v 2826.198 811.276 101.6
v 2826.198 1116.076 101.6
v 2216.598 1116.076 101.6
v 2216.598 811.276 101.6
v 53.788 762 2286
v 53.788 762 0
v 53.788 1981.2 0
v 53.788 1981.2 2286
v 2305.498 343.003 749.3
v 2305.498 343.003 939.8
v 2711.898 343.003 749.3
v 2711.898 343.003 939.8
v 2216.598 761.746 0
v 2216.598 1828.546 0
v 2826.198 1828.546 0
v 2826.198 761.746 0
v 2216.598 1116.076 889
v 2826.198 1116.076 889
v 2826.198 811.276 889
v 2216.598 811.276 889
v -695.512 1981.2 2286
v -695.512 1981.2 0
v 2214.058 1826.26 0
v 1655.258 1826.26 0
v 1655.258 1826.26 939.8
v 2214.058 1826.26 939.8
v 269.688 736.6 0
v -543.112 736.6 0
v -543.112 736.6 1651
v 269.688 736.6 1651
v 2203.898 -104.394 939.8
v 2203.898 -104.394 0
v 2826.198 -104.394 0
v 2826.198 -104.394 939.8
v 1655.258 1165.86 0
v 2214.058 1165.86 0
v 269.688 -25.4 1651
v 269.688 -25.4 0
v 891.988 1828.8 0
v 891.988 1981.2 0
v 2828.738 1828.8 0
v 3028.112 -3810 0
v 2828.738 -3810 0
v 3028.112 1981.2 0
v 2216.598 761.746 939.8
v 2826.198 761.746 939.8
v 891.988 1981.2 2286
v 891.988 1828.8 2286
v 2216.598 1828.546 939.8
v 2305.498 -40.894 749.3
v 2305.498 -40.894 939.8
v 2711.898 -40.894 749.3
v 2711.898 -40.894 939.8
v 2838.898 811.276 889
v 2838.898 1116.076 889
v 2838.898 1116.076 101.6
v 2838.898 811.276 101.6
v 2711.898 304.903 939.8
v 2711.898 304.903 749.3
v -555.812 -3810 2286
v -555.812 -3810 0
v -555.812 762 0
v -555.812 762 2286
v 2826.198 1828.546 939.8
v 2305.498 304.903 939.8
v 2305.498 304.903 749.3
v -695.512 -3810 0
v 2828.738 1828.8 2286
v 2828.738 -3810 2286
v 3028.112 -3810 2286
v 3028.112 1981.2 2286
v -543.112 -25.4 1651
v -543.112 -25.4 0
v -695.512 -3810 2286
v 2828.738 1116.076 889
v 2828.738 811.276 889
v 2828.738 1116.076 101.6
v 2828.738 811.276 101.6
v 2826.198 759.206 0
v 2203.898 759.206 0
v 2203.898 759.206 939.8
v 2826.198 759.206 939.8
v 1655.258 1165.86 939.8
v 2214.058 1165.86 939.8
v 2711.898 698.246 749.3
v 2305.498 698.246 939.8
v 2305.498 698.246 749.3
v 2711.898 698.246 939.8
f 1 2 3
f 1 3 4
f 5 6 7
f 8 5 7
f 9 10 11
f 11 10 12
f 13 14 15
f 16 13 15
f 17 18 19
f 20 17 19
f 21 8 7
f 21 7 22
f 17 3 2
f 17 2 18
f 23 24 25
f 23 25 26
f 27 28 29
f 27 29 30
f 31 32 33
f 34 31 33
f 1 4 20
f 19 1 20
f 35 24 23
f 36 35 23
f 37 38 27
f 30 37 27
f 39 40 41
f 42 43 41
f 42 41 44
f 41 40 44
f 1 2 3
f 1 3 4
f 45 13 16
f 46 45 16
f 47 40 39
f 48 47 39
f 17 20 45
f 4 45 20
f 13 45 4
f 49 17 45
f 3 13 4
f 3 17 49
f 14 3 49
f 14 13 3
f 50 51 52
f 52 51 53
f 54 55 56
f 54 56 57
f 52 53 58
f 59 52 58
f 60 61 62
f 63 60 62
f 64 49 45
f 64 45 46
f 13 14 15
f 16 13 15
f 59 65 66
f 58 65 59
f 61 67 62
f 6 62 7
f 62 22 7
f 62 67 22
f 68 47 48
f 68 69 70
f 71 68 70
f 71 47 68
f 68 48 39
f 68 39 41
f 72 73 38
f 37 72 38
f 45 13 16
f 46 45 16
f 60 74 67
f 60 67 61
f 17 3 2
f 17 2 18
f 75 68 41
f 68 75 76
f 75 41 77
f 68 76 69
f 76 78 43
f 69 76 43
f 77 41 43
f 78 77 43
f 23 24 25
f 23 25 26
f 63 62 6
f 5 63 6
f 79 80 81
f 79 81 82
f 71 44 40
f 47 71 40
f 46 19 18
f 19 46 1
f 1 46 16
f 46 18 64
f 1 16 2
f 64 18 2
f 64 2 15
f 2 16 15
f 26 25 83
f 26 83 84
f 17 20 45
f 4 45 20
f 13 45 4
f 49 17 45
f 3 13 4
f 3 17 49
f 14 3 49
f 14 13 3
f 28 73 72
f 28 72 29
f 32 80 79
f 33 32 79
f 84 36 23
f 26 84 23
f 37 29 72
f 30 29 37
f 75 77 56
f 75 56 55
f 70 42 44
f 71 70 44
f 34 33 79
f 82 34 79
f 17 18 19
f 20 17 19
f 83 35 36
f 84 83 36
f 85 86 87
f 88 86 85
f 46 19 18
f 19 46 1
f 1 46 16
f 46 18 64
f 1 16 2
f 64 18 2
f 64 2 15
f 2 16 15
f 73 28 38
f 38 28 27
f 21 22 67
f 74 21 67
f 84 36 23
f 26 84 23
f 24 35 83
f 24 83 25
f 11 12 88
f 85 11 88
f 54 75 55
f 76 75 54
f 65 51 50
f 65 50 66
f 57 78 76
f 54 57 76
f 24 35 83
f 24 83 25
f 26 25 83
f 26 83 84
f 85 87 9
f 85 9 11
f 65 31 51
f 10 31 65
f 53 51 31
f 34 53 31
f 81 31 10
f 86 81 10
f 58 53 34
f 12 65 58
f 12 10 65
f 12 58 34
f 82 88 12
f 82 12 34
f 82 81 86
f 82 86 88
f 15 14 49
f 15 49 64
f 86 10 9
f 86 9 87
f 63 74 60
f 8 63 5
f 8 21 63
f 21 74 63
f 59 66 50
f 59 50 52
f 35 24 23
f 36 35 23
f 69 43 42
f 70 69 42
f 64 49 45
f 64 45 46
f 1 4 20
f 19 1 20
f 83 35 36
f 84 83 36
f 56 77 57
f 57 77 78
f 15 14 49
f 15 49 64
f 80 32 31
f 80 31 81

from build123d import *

# Parameters (mm, degrees)
F1_DEPTH  = 2286
F2_W      = 812.8
F2_H      = 762
F3_DEPTH  = 1651
F4_W      = 609.6
F4_H      = 1066.8
F4_W_2    = 558.8
F4_H_2    = 660.4
F5_DEPTH  = 939.8
F6_DEPTH  = 939.8
F7_W      = 304.8
F7_H      = 787.4
F8_DEPTH  = 622.3
F9_W      = 622.3
F9_H      = 863.6
F10_DEPTH = 939.8
F11_W     = 406.4
F11_H     = 345.796715
F11_H_2   = 355.243285
F12_DEPTH = 190.5


with BuildPart() as f1:
    # F0 (on Top) → F1 (new body)
    with BuildSketch(Plane.XY):
        Polygon((2828.738347, 1981.2), (891.988347, 1981.2), (891.988347, 1828.8), (1095.188347, 1828.8), (2828.738347, 1828.8), align=None)
        Polygon((3028.111739, 1981.2), (2828.738347, 1981.2), (2828.738347, 1828.8), (2828.738347, -3810), (3028.111739, -3810), align=None)
        Polygon((-695.511653, 762), (-695.511653, -3810), (-555.811653, -3810), (-555.811653, 0), (-555.811653, 762), align=None)
        Polygon((-695.511653, 1981.2), (-695.511653, 762), (-555.811653, 762), (53.788347, 762), (53.788347, 1981.2), align=None)
    extrude(amount=F1_DEPTH)


with BuildPart() as f3:
    # F2 (on Top) → F3 (new body)
    with BuildSketch(Plane.XY):
        with Locations((-136.711653, 355.6)):
            Rectangle(F2_W, F2_H)
    extrude(amount=F3_DEPTH)


with BuildPart() as f5:
    # F4 (on Top) → F5 (new body)
    with BuildSketch(Plane.XY):
        with Locations((2521.398347, 1295.146)):
            Rectangle(F4_W, F4_H)
        with Locations((1934.658347, 1496.06)):
            Rectangle(F4_W_2, F4_H_2)
    extrude(amount=F5_DEPTH)


with BuildPart() as f6:
    # F4 (on Top) → F6 (new body)
    with BuildSketch(Plane.XY):
        with Locations((2521.398347, 1295.146)):
            Rectangle(F4_W, F4_H)
        with Locations((1934.658347, 1496.06)):
            Rectangle(F4_W_2, F4_H_2)
    extrude(amount=F6_DEPTH)


with BuildPart() as f8_tool:
    # F7 (on face) → F8 (new body)
    with BuildSketch(Plane(origin=(2216.598347, 0, 0), x_dir=(0, -1, 0), z_dir=(-1, 0, 0))):
        with Locations((-963.676, 495.3)):
            Rectangle(F7_W, F7_H)
    extrude(amount=-F8_DEPTH)


with BuildPart() as f1_1:
    add(f1.part)

    # F8: cut by f8_tool
    add(f8_tool.part, mode=Mode.SUBTRACT)


with BuildPart() as f5_1:
    add(f5.part)

    # F8: cut by f8_tool
    add(f8_tool.part, mode=Mode.SUBTRACT)


with BuildPart() as f6_1:
    add(f6.part)

    # F8: cut by f8_tool
    add(f8_tool.part, mode=Mode.SUBTRACT)


with BuildPart() as f10:
    # F9 (on Top) → F10 (new body)
    with BuildSketch(Plane.XY):
        with Locations((2515.048347, 327.406)):
            Rectangle(F9_W, F9_H)
    extrude(amount=F10_DEPTH)

    # F11 (on face) → F12 (cut)
    with BuildSketch(Plane.XY.offset(939.8)):
        with Locations((2508.698347, 132.004357)):
            Rectangle(F11_W, F11_H)
        with Locations((2508.698347, 520.624357)):
            Rectangle(F11_W, F11_H_2)
    extrude(amount=-F12_DEPTH, mode=Mode.SUBTRACT)


solid = Compound([f3.part, f1_1.part, f5_1.part, f6_1.part, f10.part])
